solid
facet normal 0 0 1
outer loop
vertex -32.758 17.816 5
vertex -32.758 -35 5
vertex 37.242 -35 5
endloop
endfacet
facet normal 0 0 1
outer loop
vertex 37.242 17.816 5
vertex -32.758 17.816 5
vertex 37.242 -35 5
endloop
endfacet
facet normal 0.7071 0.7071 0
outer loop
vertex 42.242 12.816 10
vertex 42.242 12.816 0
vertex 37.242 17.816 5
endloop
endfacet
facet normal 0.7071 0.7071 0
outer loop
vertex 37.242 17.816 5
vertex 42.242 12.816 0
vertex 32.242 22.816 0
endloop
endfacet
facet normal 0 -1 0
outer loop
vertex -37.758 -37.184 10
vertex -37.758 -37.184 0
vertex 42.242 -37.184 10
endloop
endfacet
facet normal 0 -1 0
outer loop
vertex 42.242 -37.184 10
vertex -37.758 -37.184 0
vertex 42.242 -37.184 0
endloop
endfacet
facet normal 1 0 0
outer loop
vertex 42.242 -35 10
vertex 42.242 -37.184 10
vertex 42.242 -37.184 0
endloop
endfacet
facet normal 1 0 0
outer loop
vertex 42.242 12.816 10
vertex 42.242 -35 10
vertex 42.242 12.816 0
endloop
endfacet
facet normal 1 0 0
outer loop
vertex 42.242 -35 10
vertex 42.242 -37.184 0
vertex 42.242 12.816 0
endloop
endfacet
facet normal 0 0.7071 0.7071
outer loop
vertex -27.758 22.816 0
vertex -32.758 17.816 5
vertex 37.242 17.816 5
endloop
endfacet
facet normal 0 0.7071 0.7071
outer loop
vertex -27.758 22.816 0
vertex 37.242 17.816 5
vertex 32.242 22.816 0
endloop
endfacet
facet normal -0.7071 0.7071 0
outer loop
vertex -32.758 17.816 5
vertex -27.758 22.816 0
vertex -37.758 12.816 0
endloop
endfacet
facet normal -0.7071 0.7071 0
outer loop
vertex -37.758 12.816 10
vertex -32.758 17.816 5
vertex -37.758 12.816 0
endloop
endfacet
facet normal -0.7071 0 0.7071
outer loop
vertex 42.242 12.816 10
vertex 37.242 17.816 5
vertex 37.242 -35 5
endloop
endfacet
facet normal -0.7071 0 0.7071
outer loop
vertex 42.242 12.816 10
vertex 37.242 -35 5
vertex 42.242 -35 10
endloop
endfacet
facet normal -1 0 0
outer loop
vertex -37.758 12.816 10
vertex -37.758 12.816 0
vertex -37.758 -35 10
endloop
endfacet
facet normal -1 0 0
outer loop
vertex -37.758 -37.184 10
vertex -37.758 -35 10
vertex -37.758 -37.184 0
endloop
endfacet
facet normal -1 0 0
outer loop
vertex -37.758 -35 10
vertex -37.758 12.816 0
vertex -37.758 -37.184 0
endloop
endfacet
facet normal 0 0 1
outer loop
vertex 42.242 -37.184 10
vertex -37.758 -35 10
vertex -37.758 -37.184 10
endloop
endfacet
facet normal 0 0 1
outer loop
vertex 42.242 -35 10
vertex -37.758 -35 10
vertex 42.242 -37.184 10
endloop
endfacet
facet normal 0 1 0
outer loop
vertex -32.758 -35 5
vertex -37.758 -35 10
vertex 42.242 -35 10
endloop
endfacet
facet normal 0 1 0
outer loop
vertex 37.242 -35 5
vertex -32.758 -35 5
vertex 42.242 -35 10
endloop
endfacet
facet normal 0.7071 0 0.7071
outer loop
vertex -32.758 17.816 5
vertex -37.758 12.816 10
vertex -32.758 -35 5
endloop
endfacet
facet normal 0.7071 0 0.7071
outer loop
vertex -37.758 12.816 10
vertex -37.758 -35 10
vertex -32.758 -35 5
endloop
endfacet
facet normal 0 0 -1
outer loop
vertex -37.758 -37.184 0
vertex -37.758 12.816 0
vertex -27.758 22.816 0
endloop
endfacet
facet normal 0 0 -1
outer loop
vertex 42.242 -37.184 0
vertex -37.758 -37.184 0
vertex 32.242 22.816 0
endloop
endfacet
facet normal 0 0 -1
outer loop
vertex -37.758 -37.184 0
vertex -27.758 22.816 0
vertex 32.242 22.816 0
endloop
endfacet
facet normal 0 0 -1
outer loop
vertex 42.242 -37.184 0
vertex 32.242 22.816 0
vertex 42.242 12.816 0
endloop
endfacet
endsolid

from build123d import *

# Parameters (mm, degrees)
F1_DEPTH = 10
F3_DEPTH = 42.24330811
F4_DEPTH = 37.75869189
F6_DEPTH = 35
F7_DEPTH = 25


with BuildPart() as f1:
    # F0 (on Top) → F1 (new body)
    with BuildSketch(Plane.XY):
        Polygon((32.24230811, 22.8156701593), (-27.75769189, 22.8156701593), (-37.75769189, 12.8156701593), (-37.75769189, -37.1843298407), (42.24230811, -37.1843298407), (42.24230811, 12.8156701593), align=None)
    extrude(amount=F1_DEPTH)

    # F2 (on Right) → F3 (cut, through all)
    with BuildSketch(Plane.YZ):
        Polygon((22.8156701593, 0), (22.8156701593, 10), (12.8156701593, 10), align=None)
    extrude(amount=F3_DEPTH, mode=Mode.SUBTRACT)

    # F2 (on Right) → F4 (cut, through all)
    with BuildSketch(Plane.YZ):
        Polygon((22.8156701593, 0), (22.8156701593, 10), (12.8156701593, 10), align=None)
    extrude(amount=-F4_DEPTH, mode=Mode.SUBTRACT)

    # F5 (on Front) → F6 (cut)
    with BuildSketch(Plane.XZ):
        Polygon((37.24230811, 5), (42.24230811, 10), (-37.75769189, 10), (-32.75769189, 5), align=None)
    extrude(amount=F6_DEPTH, mode=Mode.SUBTRACT)

    # F5 (on Front) → F7 (cut)
    with BuildSketch(Plane.XZ):
        Polygon((37.24230811, 5), (42.24230811, 10), (-37.75769189, 10), (-32.75769189, 5), align=None)
    extrude(amount=-F7_DEPTH, mode=Mode.SUBTRACT)


solid = f1.part
